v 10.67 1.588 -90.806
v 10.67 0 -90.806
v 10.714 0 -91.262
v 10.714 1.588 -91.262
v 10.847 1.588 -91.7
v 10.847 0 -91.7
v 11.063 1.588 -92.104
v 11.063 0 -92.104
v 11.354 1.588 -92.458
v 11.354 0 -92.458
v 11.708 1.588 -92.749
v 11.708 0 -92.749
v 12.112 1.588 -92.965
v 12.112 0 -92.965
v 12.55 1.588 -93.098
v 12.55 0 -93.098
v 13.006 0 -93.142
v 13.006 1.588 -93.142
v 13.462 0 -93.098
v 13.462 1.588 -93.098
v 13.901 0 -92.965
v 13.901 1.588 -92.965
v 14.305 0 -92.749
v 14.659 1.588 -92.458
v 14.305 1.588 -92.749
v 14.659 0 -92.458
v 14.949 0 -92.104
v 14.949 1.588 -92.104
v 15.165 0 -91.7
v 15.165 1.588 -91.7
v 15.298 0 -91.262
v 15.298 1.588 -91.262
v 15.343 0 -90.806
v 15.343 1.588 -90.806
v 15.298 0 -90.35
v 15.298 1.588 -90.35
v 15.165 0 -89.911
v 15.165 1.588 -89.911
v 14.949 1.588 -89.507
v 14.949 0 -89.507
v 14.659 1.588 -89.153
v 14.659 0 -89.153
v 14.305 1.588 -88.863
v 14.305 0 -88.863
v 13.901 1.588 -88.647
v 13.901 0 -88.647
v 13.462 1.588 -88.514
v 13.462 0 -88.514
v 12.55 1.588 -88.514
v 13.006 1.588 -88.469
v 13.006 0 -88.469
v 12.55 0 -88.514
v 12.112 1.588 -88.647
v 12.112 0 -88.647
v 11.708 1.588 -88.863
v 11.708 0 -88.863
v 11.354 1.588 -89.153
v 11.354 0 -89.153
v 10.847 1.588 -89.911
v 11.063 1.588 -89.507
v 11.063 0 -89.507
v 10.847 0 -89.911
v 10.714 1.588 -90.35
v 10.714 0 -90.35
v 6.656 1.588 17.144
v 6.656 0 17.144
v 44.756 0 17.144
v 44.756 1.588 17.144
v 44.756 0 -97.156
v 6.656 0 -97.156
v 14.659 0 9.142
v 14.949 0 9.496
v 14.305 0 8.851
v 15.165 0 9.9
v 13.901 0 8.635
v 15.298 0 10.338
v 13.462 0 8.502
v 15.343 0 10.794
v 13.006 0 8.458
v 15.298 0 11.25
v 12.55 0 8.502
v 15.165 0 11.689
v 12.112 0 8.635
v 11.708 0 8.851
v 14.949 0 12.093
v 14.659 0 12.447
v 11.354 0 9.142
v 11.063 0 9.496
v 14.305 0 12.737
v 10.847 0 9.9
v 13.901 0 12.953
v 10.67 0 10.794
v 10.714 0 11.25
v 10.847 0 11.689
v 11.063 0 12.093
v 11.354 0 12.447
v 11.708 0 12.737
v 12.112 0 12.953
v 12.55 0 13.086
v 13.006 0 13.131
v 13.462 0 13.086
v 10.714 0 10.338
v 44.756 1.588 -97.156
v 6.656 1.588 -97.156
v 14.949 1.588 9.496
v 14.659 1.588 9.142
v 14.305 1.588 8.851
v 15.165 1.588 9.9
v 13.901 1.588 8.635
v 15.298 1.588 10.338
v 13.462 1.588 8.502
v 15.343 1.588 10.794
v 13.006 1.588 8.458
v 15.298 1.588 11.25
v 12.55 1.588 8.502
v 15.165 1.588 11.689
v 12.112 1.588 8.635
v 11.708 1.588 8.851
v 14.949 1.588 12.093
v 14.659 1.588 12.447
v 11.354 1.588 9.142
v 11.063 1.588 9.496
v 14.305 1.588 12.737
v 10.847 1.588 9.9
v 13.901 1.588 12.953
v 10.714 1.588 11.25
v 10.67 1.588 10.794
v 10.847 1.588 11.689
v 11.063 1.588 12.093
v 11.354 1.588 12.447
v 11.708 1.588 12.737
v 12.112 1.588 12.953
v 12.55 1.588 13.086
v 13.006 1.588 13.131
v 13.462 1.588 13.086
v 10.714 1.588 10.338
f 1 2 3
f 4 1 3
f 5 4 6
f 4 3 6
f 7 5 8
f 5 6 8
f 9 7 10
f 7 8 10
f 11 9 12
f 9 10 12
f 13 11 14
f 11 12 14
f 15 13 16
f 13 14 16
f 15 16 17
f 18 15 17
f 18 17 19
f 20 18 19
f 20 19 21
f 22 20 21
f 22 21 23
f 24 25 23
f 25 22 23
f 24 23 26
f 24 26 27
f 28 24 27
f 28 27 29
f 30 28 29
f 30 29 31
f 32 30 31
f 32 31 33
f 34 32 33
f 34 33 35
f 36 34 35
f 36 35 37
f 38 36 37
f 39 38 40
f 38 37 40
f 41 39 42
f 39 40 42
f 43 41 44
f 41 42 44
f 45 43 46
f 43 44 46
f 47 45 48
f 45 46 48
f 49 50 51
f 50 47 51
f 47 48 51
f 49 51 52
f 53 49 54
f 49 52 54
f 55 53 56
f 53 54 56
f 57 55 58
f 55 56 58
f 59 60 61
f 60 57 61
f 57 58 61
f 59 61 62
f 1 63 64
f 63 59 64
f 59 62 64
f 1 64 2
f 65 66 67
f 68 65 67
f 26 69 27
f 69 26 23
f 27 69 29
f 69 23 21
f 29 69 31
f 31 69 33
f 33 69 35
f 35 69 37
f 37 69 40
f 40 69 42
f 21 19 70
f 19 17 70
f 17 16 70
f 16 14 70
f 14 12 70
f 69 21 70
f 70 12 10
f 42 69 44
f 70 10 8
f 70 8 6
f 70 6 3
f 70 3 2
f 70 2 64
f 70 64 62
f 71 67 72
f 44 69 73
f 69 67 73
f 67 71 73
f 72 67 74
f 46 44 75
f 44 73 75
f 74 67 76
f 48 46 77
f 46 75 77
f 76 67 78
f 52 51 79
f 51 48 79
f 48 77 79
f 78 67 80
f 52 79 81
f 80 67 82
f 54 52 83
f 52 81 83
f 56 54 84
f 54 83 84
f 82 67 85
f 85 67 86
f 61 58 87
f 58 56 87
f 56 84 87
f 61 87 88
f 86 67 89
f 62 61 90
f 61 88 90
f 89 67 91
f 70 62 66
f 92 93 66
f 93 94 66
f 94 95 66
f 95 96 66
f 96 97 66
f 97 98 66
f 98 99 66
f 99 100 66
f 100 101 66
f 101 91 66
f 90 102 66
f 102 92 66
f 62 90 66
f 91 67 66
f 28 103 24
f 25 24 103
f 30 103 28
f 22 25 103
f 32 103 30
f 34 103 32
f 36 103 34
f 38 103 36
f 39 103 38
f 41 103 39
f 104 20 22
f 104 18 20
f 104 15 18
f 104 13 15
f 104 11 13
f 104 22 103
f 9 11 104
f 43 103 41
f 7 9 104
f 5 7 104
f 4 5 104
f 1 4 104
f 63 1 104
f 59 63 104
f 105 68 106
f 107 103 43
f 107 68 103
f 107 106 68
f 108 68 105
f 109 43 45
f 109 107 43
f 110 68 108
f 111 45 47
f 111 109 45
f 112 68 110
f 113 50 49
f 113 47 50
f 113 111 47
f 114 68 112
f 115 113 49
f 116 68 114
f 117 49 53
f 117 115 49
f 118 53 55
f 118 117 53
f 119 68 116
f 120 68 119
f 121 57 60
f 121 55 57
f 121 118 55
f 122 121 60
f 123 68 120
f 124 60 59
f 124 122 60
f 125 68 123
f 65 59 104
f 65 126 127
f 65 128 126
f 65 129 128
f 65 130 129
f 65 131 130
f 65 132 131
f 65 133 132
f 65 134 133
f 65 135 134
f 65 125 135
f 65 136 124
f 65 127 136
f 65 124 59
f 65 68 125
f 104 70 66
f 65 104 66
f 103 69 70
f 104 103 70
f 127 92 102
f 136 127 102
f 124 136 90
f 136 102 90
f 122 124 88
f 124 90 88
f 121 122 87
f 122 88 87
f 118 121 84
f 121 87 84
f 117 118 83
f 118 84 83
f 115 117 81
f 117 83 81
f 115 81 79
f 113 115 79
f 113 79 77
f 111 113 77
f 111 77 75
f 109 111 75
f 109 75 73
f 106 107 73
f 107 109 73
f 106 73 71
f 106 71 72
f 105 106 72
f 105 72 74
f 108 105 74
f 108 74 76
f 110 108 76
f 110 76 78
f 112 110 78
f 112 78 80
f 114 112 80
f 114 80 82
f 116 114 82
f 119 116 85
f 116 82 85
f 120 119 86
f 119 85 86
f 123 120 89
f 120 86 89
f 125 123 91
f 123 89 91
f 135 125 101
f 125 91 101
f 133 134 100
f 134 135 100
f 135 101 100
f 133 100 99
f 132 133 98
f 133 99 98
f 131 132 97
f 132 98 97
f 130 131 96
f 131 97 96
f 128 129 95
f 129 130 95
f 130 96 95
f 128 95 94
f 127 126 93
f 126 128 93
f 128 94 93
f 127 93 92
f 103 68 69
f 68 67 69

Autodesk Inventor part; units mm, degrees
ref_plane "YZ Plane" through (0, 0, 0) normal (1, 0, 0) x (0, 1, 0)
ref_plane "XZ Plane" through (0, 0, 0) normal (0, 1, 0) x (-1, 0, 0)
ref_plane "XY Plane" through (0, 0, 0) normal (0, 0, 1) x (1, 0, 0)
sketch "Sketch4" plane through (0, 0, 0) normal (0, 1, 0) x (-1, 0, 0)
  line L0 (-6.6563, 17.1443) -> (-44.7563, 17.1443)
  line L1 (-44.7563, 17.1443) -> (-44.7563, -97.1557)
  line L2 (-44.7563, -97.1557) -> (-6.6563, -97.1557)
  line L3 (-6.6563, -97.1557) -> (-6.6563, 17.1443)
  circle A0 centre (-13.0063, 10.7943) radius 2.3368
  circle A1 centre (-13.0063, -90.8057) radius 2.3368
  point P0 (0, 0)
  dimension "d41" = 38.1
  dimension "d42" = 114.3
  dimension "d43" = 4.6736
  dimension "d44" = 4.6736
  dimension "d45" = 6.35
  dimension "d46" = 6.35
  dimension "d47" = 6.35
  dimension "d48" = 6.35
extrude "Plate4" add sketch "Sketch4" along normal blind 1.5875
equation "\"d49\" = Thickness"
equation "\"BendRadius\" = Thickness"
equation "\"BendReliefWidth\" = Thickness"
equation "\"BendReliefDepth\" = 0.5 * Thickness"
equation "\"CornerReliefSize\" = 4 * Thickness"
equation "\"MinimumRemnant\" = 2 * Thickness"
equation "\"TransitionRadius\" = BendRadius"
equation "\"JacobiRadiusSize\" = BendRadius"
equation "\"GapSize\" = Thickness"
equation "\"Thickness\" = 1.5875"
properties part number "underside"
